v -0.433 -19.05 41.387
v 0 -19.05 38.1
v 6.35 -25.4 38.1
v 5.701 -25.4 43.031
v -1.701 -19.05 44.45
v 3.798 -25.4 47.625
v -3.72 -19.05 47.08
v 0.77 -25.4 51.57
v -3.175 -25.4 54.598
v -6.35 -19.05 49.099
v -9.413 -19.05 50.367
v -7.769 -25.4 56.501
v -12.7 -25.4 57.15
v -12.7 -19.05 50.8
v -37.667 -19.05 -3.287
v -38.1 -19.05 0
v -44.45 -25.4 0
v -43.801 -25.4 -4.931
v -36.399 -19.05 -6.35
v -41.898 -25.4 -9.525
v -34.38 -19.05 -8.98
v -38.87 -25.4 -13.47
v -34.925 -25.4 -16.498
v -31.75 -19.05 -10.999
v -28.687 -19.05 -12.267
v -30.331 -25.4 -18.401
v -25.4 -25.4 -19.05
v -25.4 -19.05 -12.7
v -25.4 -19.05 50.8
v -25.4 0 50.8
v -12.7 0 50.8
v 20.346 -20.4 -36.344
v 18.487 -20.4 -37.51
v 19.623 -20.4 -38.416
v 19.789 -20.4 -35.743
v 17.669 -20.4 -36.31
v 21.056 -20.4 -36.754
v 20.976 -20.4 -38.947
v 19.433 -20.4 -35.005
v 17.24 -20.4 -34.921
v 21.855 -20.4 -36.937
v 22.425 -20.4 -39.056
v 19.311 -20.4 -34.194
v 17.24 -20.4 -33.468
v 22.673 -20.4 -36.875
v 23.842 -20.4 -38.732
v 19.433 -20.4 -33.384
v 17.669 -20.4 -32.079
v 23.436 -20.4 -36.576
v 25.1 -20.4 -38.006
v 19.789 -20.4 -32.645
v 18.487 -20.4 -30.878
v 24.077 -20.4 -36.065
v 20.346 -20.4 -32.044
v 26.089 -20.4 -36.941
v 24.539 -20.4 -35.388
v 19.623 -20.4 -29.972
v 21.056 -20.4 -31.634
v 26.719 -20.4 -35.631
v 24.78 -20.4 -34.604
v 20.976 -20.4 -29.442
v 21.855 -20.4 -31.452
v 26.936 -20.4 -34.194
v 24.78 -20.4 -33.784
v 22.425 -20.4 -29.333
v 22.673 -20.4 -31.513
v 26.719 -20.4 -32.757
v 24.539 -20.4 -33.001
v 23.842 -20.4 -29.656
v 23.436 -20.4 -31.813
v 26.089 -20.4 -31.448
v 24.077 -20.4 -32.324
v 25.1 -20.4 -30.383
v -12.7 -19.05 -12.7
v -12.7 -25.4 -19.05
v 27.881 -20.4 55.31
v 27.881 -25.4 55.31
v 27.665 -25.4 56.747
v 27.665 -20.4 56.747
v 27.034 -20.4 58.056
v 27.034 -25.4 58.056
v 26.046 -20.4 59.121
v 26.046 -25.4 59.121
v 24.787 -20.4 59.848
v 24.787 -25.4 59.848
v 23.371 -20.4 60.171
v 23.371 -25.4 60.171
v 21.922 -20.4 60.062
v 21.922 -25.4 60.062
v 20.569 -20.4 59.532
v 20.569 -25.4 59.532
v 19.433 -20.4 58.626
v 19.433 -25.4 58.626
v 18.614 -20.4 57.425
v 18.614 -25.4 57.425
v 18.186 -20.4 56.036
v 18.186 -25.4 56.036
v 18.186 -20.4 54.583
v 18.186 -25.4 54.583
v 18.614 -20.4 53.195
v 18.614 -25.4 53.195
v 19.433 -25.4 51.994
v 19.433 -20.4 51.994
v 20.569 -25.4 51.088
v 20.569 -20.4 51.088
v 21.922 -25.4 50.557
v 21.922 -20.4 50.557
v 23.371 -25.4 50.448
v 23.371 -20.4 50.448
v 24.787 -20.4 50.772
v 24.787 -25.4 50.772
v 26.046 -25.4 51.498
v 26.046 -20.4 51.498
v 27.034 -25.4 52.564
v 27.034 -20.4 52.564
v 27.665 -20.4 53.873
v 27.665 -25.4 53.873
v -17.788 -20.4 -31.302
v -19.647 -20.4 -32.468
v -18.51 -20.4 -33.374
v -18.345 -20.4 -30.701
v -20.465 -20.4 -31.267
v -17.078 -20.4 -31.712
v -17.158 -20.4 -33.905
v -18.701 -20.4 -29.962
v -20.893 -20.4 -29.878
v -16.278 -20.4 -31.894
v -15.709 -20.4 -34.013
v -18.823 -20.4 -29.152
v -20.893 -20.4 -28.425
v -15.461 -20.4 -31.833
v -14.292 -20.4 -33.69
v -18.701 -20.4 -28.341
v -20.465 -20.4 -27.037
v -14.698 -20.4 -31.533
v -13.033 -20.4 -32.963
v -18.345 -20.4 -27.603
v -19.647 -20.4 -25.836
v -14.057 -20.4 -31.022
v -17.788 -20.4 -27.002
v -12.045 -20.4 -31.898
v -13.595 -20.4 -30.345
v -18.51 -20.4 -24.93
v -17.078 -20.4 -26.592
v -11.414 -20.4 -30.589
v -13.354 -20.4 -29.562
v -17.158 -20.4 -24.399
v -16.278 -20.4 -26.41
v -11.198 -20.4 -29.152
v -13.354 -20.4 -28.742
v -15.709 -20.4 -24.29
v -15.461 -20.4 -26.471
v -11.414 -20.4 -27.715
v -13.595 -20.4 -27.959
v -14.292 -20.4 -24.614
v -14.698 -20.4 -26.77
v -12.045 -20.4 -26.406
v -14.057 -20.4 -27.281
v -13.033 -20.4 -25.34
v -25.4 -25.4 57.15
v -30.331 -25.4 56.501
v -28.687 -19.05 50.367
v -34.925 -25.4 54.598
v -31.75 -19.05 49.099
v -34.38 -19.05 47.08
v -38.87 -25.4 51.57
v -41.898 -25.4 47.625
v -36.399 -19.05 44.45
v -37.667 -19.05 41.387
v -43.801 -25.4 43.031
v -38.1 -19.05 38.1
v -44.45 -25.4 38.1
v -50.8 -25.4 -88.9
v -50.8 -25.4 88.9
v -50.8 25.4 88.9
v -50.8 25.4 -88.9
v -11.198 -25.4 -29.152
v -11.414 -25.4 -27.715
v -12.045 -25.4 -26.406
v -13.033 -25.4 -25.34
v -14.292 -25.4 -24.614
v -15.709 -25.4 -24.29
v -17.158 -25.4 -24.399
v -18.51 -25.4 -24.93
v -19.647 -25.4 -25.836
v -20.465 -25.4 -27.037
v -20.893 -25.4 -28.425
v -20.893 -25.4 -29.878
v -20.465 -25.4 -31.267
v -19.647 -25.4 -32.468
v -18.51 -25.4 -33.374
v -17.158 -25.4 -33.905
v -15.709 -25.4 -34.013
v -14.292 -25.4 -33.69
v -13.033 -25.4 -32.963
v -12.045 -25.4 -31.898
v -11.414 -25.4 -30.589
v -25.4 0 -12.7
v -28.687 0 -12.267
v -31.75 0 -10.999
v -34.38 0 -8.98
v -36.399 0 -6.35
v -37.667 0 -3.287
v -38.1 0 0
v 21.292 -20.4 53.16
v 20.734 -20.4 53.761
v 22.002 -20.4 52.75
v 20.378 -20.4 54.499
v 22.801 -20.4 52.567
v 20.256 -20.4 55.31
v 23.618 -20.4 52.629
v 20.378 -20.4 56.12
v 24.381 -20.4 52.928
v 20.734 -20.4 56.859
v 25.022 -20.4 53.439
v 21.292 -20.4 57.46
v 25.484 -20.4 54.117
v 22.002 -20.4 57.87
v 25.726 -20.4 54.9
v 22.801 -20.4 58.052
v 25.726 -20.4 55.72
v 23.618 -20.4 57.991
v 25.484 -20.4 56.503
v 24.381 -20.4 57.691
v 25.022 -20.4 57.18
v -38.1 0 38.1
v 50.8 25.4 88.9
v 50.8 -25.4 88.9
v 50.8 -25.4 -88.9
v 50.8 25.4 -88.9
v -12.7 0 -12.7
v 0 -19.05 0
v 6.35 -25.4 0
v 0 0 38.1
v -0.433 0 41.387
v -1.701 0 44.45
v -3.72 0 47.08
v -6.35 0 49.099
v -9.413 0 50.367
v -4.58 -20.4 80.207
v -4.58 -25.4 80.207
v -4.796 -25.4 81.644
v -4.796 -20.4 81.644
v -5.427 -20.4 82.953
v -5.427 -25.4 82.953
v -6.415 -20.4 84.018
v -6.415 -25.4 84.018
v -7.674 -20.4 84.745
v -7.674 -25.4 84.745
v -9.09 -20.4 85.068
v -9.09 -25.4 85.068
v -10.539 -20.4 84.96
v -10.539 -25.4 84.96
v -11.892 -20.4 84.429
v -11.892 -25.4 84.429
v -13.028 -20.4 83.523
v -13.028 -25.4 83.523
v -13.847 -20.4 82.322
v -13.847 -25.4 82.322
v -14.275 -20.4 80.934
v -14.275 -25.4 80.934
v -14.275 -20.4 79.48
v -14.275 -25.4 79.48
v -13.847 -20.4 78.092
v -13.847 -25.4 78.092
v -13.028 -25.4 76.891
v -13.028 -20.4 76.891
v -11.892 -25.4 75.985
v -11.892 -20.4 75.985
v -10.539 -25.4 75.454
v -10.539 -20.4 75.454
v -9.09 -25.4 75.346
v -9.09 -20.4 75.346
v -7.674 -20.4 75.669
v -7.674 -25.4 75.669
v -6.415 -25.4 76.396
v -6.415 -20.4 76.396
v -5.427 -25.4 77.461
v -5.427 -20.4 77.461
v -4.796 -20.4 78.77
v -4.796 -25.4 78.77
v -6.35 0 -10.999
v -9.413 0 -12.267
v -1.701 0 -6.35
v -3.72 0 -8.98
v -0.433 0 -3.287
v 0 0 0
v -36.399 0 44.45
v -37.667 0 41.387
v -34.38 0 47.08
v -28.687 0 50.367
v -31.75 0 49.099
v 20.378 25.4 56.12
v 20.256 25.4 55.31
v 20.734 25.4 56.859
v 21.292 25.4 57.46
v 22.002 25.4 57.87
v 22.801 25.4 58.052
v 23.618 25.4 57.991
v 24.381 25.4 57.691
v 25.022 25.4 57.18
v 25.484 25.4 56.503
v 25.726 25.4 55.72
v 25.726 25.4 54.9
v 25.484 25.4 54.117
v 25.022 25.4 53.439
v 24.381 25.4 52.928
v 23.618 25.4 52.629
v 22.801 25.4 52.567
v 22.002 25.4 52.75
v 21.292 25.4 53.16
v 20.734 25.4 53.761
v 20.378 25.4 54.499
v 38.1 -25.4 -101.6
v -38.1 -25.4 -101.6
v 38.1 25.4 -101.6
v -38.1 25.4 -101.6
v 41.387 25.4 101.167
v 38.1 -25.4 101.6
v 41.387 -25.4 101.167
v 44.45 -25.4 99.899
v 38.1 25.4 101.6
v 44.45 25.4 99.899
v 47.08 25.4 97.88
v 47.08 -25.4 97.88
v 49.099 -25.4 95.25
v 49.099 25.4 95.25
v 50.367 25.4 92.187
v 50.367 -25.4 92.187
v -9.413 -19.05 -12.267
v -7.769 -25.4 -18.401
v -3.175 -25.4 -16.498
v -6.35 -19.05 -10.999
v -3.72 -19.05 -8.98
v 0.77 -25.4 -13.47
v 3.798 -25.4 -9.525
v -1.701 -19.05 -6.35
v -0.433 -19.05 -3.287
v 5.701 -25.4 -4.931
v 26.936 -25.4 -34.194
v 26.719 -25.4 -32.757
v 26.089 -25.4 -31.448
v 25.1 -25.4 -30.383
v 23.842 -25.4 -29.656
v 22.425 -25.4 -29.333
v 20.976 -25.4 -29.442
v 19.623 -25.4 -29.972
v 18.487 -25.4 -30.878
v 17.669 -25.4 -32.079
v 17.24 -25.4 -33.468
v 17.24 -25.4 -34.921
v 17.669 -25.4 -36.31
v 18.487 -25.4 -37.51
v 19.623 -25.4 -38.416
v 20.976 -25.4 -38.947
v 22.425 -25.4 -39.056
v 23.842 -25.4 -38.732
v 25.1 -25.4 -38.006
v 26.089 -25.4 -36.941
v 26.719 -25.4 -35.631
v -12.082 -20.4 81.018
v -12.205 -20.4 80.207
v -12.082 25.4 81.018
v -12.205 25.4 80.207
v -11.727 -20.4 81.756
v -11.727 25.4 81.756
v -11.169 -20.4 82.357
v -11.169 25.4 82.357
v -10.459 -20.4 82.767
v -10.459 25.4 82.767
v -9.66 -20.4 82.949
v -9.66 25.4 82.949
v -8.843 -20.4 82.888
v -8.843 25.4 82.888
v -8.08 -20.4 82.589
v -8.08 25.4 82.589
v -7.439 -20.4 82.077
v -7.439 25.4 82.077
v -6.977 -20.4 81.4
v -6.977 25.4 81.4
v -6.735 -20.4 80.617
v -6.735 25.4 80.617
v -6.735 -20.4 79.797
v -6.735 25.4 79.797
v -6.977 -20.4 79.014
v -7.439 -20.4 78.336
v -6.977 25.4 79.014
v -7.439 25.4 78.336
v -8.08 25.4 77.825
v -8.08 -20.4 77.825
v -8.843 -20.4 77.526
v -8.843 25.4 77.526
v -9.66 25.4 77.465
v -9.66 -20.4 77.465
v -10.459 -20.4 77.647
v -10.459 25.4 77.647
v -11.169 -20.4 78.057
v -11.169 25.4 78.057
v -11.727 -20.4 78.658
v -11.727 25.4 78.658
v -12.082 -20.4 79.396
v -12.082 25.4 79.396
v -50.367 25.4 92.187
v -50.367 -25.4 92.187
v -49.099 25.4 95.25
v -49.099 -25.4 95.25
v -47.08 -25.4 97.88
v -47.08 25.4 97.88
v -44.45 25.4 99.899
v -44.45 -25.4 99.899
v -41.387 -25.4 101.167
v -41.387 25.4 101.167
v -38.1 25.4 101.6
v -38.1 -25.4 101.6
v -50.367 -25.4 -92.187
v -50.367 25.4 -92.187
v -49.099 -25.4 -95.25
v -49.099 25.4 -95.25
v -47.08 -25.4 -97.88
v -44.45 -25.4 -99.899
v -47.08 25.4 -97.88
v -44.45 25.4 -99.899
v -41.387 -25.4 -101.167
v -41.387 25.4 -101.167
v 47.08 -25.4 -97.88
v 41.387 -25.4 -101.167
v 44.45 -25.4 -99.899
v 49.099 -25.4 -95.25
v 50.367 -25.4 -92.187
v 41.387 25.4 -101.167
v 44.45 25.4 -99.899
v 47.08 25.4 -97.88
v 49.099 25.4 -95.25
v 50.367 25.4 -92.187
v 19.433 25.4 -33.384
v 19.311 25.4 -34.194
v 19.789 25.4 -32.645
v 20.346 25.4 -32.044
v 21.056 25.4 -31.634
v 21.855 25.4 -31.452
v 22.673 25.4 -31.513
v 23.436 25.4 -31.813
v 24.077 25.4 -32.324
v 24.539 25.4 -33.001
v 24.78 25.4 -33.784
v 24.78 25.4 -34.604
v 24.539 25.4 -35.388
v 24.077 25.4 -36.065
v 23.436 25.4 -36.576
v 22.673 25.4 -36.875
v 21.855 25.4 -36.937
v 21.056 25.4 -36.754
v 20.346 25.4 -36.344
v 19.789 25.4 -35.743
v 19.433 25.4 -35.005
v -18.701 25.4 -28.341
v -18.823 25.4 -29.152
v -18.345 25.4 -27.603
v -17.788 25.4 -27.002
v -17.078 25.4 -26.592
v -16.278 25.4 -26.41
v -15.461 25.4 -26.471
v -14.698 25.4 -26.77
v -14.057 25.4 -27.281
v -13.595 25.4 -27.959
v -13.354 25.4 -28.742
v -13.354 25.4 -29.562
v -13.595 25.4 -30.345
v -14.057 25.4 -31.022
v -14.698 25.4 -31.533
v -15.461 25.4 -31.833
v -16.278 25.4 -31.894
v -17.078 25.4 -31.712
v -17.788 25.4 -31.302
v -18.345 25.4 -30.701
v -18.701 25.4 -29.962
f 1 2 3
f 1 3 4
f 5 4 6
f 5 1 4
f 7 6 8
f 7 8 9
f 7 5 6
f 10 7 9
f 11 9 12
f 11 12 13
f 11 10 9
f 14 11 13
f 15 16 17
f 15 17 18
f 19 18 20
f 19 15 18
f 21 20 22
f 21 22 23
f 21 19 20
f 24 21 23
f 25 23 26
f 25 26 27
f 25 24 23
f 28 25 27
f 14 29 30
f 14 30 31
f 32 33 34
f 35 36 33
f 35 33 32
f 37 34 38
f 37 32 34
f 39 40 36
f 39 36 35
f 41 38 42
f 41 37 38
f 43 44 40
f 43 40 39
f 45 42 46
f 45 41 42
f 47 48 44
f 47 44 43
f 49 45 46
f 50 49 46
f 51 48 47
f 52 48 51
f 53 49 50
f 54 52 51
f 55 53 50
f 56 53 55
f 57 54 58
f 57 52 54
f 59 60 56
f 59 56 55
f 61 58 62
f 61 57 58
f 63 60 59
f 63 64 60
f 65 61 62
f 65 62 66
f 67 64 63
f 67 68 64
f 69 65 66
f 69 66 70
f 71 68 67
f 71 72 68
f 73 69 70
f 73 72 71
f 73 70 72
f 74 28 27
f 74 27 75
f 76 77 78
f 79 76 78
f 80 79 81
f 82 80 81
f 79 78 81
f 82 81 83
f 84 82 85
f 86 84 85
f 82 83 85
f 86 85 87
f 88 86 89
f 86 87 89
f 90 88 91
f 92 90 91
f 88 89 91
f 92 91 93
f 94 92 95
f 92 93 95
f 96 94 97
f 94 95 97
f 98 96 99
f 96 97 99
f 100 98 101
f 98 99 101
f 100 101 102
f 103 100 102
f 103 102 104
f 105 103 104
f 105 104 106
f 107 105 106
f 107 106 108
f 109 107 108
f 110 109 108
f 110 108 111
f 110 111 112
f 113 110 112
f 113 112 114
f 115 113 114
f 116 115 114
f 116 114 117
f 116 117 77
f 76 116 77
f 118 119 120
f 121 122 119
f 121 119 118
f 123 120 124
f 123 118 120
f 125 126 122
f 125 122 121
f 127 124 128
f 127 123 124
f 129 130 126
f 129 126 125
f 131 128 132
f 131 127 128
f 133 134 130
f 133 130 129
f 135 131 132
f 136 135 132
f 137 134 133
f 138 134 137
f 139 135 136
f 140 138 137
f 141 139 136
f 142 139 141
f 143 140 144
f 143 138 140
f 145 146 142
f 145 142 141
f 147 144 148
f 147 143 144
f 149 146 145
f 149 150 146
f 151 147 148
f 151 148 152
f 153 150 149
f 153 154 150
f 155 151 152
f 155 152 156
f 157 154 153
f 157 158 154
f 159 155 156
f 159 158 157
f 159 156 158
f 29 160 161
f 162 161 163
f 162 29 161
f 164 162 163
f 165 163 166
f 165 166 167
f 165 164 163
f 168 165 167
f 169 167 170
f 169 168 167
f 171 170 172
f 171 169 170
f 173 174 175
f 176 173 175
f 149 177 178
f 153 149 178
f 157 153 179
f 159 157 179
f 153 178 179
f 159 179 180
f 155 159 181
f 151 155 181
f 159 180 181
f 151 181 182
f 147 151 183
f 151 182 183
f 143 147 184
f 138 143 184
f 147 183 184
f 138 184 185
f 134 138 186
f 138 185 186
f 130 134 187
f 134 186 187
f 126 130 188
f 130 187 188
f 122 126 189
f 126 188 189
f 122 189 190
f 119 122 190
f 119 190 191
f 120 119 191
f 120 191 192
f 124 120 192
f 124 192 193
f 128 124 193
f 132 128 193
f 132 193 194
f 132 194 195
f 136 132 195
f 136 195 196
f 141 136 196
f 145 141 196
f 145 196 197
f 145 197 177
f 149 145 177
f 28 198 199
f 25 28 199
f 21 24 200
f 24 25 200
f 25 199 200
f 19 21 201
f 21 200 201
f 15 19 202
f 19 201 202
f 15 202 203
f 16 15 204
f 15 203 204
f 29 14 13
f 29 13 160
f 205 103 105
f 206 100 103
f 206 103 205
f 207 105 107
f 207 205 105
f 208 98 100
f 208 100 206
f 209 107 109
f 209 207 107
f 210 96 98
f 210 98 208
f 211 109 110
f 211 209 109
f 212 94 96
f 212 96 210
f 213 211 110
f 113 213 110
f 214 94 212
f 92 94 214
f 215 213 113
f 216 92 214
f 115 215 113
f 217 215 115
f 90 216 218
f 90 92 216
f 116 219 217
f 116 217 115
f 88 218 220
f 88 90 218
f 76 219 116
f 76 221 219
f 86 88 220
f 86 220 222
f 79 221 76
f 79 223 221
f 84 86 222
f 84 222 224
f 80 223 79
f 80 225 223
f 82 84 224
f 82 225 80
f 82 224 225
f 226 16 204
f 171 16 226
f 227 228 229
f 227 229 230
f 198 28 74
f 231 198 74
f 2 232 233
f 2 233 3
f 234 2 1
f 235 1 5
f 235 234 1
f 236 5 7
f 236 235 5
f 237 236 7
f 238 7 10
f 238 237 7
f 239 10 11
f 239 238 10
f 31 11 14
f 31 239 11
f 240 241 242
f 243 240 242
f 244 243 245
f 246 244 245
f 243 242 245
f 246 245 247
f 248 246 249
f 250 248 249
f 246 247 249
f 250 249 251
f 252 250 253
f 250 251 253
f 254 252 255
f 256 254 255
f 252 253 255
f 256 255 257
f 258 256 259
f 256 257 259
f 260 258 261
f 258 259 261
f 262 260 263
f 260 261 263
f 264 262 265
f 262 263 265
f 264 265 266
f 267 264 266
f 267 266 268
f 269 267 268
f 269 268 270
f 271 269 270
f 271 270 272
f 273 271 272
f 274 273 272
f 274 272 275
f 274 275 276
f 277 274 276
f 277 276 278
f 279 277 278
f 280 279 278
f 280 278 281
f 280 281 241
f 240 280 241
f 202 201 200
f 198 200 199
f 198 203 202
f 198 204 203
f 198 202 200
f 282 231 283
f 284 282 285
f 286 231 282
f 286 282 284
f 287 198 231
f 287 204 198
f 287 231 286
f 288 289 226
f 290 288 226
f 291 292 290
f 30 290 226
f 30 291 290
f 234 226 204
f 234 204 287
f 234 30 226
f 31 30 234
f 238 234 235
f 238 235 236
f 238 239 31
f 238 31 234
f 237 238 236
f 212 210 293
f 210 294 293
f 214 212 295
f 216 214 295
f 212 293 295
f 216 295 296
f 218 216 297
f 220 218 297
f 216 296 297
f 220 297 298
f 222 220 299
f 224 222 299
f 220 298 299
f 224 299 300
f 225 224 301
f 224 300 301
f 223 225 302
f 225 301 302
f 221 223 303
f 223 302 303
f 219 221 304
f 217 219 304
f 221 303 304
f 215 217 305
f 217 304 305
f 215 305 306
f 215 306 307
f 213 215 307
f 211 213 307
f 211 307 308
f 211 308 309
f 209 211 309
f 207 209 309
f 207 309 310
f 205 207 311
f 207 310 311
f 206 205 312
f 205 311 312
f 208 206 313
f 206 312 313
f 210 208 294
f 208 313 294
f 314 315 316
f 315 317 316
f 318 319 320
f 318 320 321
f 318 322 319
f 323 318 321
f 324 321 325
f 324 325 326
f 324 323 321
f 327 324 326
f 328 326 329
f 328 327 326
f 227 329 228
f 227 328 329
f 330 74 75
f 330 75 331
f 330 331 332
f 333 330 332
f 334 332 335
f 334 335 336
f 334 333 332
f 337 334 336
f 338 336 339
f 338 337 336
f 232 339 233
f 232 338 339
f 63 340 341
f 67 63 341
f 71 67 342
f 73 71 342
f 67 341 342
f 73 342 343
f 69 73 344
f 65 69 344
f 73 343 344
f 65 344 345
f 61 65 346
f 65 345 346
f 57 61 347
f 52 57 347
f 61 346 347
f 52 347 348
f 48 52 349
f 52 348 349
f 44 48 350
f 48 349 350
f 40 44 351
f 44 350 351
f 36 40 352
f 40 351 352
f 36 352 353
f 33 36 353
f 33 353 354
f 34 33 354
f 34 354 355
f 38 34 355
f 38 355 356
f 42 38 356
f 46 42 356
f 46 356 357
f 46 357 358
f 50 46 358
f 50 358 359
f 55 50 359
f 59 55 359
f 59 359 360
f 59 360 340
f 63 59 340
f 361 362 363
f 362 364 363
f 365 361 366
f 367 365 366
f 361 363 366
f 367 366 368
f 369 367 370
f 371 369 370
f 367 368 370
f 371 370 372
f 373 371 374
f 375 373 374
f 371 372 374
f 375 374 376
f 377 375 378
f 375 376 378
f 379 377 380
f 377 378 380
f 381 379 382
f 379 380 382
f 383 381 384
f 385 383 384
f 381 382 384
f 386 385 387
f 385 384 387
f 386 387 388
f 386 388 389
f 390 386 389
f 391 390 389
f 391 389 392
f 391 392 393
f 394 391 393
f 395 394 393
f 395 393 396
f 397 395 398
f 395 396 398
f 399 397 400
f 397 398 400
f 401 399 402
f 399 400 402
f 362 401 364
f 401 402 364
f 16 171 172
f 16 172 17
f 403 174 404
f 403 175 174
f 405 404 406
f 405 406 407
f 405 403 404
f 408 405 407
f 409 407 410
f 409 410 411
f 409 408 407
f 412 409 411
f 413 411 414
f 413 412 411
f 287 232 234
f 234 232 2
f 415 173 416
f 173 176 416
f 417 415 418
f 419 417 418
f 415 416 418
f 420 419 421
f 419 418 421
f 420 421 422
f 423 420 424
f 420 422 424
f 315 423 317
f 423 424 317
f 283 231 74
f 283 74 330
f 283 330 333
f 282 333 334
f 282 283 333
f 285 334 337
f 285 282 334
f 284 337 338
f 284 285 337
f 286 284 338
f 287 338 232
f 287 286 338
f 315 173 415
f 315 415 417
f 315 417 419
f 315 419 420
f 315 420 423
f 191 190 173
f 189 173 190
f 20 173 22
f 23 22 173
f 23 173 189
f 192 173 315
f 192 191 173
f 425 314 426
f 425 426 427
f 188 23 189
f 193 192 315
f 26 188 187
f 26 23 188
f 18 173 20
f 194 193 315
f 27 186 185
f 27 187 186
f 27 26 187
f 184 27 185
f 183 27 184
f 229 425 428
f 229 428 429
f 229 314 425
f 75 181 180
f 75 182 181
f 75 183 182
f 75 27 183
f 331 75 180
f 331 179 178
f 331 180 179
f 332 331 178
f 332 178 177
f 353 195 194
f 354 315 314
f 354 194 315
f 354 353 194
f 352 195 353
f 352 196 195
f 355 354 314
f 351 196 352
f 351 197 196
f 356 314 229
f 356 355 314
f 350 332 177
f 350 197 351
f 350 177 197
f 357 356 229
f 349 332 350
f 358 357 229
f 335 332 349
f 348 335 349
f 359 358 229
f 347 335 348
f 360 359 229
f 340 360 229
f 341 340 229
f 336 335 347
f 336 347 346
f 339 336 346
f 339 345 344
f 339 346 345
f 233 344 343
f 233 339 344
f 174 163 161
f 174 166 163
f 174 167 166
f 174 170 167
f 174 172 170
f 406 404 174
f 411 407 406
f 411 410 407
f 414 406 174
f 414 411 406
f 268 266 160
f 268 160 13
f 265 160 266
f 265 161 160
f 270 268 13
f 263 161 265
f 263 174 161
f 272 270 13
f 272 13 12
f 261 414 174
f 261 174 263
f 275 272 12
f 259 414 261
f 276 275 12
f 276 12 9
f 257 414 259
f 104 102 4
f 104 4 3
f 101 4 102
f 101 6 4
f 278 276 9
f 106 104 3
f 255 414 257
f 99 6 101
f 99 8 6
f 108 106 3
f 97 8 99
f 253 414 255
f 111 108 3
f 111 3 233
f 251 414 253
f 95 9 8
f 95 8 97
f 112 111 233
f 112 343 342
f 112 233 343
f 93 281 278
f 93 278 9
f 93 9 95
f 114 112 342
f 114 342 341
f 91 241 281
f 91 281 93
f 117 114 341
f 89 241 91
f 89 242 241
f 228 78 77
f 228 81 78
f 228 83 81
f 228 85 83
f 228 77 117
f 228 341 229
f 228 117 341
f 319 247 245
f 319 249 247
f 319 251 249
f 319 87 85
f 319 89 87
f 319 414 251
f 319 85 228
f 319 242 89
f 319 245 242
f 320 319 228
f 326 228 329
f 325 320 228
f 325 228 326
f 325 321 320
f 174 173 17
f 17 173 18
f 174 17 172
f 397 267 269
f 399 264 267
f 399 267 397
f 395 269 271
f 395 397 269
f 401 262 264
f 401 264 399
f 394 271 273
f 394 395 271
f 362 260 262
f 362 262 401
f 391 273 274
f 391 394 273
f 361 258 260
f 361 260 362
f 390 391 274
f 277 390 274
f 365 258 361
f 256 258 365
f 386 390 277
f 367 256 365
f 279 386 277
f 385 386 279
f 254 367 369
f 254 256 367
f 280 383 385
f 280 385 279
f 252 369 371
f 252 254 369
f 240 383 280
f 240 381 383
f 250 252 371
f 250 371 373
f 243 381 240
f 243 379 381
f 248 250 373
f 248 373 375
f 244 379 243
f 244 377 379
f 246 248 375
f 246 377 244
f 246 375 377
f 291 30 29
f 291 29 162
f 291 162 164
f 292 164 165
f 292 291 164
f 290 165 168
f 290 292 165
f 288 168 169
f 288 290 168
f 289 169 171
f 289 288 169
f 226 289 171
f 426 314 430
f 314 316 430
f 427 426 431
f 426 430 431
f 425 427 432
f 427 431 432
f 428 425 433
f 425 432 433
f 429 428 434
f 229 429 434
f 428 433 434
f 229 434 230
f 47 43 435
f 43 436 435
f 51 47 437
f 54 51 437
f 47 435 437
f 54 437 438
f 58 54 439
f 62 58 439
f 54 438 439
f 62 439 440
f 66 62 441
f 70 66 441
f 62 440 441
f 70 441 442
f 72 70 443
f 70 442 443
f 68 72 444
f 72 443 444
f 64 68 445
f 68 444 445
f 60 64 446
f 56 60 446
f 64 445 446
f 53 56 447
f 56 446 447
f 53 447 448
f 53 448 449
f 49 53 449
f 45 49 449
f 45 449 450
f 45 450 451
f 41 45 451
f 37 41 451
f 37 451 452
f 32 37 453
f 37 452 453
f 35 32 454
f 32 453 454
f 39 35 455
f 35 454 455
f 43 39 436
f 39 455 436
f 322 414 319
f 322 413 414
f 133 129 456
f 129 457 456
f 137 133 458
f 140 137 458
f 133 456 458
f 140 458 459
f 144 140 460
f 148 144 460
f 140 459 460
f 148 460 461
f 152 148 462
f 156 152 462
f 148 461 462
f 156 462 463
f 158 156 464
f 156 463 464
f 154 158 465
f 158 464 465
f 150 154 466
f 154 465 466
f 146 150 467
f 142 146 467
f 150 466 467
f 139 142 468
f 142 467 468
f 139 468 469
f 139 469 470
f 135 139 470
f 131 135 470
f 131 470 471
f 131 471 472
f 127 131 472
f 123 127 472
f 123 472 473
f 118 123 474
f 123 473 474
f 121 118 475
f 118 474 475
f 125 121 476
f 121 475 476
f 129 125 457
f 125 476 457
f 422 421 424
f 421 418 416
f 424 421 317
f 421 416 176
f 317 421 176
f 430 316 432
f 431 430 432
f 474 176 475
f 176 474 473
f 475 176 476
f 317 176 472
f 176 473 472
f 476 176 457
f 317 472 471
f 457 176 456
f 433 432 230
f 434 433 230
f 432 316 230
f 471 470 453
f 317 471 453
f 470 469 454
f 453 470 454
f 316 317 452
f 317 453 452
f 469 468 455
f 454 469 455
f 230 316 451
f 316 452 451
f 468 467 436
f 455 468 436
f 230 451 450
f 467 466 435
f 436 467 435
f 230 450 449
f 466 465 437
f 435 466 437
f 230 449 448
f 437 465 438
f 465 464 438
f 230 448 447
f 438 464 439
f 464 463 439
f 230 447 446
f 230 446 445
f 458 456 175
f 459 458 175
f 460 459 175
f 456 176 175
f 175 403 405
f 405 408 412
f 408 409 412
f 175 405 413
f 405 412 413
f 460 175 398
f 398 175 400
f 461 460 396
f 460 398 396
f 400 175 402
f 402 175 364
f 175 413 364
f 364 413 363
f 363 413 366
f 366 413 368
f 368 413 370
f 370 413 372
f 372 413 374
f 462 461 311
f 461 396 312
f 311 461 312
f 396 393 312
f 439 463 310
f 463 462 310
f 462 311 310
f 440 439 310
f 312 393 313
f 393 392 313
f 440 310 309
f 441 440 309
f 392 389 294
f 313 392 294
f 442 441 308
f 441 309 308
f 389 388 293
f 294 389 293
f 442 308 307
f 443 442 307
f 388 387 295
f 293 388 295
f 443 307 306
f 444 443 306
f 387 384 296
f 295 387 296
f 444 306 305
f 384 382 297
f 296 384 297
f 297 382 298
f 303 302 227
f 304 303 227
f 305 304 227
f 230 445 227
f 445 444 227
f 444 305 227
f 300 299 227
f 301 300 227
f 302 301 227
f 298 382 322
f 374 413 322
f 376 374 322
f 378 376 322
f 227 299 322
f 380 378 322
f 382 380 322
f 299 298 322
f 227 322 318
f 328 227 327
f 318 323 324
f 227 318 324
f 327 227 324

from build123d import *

# Parameters (mm, degrees)
F0_W           = 101.6
F0_H           = 50.8
F1_DEPTH       = 101.6
F3_D           = 5.5
F3_CBORE_D     = 9.75
F3_CBORE_DEPTH = 5
F4_R           = 12.7
F5_W           = 38.1
F5_H           = 63.5
F6_DEPTH       = 25.4
F7_R           = 12.7
F8_SIZE        = 6.35


with BuildPart() as f1:
    # F0 (on Top) → F1 (new body, symmetric)
    with BuildSketch(Plane.XY):
        Rectangle(F0_W, F0_H)
    extrude(amount=F1_DEPTH, both=True)

    # F3 (through all)
    with Locations(Plane.XZ.offset(25.4)):
        with Locations((-9.4546508044, 80.2069678903), (23.0063218623, 55.3097166121), (-16.0729084164, -29.151847586), (22.0608543605, -34.1943278909)):
            CounterBoreHole(F3_D / 2, F3_CBORE_D / 2, F3_CBORE_DEPTH)

    # F4
    f4_edges = [f1.edges().sort_by_distance(p)[0] for p in [
        (-50.8, 0, 101.6),
        (50.8, 0, 101.6),
        (-50.8, 0, -101.6),
        (50.8, 0, -101.6),
    ]]
    fillet(f4_edges, radius=F4_R)

    # F5 (on face) → F6 (cut)
    with BuildSketch(Plane.XZ.offset(25.4)):
        with Locations((-19.05, 19.05)):
            Rectangle(F5_W, F5_H)
    extrude(amount=-F6_DEPTH, mode=Mode.SUBTRACT)

    # F7
    f7_edges = [f1.edges().sort_by_distance(p)[0] for p in [
        (0, -12.7, 50.8),
        (-38.1, -12.7, 50.8),
        (-38.1, -12.7, -12.7),
        (0, -12.7, -12.7),
    ]]
    fillet(f7_edges, radius=F7_R)

    # F8
    f8_edges = [f1.edges().sort_by_distance(p)[0] for p in [
        (-34.380256, -25.4, 47.080256),
    ]]
    chamfer(f8_edges, length=F8_SIZE)


solid = f1.part
